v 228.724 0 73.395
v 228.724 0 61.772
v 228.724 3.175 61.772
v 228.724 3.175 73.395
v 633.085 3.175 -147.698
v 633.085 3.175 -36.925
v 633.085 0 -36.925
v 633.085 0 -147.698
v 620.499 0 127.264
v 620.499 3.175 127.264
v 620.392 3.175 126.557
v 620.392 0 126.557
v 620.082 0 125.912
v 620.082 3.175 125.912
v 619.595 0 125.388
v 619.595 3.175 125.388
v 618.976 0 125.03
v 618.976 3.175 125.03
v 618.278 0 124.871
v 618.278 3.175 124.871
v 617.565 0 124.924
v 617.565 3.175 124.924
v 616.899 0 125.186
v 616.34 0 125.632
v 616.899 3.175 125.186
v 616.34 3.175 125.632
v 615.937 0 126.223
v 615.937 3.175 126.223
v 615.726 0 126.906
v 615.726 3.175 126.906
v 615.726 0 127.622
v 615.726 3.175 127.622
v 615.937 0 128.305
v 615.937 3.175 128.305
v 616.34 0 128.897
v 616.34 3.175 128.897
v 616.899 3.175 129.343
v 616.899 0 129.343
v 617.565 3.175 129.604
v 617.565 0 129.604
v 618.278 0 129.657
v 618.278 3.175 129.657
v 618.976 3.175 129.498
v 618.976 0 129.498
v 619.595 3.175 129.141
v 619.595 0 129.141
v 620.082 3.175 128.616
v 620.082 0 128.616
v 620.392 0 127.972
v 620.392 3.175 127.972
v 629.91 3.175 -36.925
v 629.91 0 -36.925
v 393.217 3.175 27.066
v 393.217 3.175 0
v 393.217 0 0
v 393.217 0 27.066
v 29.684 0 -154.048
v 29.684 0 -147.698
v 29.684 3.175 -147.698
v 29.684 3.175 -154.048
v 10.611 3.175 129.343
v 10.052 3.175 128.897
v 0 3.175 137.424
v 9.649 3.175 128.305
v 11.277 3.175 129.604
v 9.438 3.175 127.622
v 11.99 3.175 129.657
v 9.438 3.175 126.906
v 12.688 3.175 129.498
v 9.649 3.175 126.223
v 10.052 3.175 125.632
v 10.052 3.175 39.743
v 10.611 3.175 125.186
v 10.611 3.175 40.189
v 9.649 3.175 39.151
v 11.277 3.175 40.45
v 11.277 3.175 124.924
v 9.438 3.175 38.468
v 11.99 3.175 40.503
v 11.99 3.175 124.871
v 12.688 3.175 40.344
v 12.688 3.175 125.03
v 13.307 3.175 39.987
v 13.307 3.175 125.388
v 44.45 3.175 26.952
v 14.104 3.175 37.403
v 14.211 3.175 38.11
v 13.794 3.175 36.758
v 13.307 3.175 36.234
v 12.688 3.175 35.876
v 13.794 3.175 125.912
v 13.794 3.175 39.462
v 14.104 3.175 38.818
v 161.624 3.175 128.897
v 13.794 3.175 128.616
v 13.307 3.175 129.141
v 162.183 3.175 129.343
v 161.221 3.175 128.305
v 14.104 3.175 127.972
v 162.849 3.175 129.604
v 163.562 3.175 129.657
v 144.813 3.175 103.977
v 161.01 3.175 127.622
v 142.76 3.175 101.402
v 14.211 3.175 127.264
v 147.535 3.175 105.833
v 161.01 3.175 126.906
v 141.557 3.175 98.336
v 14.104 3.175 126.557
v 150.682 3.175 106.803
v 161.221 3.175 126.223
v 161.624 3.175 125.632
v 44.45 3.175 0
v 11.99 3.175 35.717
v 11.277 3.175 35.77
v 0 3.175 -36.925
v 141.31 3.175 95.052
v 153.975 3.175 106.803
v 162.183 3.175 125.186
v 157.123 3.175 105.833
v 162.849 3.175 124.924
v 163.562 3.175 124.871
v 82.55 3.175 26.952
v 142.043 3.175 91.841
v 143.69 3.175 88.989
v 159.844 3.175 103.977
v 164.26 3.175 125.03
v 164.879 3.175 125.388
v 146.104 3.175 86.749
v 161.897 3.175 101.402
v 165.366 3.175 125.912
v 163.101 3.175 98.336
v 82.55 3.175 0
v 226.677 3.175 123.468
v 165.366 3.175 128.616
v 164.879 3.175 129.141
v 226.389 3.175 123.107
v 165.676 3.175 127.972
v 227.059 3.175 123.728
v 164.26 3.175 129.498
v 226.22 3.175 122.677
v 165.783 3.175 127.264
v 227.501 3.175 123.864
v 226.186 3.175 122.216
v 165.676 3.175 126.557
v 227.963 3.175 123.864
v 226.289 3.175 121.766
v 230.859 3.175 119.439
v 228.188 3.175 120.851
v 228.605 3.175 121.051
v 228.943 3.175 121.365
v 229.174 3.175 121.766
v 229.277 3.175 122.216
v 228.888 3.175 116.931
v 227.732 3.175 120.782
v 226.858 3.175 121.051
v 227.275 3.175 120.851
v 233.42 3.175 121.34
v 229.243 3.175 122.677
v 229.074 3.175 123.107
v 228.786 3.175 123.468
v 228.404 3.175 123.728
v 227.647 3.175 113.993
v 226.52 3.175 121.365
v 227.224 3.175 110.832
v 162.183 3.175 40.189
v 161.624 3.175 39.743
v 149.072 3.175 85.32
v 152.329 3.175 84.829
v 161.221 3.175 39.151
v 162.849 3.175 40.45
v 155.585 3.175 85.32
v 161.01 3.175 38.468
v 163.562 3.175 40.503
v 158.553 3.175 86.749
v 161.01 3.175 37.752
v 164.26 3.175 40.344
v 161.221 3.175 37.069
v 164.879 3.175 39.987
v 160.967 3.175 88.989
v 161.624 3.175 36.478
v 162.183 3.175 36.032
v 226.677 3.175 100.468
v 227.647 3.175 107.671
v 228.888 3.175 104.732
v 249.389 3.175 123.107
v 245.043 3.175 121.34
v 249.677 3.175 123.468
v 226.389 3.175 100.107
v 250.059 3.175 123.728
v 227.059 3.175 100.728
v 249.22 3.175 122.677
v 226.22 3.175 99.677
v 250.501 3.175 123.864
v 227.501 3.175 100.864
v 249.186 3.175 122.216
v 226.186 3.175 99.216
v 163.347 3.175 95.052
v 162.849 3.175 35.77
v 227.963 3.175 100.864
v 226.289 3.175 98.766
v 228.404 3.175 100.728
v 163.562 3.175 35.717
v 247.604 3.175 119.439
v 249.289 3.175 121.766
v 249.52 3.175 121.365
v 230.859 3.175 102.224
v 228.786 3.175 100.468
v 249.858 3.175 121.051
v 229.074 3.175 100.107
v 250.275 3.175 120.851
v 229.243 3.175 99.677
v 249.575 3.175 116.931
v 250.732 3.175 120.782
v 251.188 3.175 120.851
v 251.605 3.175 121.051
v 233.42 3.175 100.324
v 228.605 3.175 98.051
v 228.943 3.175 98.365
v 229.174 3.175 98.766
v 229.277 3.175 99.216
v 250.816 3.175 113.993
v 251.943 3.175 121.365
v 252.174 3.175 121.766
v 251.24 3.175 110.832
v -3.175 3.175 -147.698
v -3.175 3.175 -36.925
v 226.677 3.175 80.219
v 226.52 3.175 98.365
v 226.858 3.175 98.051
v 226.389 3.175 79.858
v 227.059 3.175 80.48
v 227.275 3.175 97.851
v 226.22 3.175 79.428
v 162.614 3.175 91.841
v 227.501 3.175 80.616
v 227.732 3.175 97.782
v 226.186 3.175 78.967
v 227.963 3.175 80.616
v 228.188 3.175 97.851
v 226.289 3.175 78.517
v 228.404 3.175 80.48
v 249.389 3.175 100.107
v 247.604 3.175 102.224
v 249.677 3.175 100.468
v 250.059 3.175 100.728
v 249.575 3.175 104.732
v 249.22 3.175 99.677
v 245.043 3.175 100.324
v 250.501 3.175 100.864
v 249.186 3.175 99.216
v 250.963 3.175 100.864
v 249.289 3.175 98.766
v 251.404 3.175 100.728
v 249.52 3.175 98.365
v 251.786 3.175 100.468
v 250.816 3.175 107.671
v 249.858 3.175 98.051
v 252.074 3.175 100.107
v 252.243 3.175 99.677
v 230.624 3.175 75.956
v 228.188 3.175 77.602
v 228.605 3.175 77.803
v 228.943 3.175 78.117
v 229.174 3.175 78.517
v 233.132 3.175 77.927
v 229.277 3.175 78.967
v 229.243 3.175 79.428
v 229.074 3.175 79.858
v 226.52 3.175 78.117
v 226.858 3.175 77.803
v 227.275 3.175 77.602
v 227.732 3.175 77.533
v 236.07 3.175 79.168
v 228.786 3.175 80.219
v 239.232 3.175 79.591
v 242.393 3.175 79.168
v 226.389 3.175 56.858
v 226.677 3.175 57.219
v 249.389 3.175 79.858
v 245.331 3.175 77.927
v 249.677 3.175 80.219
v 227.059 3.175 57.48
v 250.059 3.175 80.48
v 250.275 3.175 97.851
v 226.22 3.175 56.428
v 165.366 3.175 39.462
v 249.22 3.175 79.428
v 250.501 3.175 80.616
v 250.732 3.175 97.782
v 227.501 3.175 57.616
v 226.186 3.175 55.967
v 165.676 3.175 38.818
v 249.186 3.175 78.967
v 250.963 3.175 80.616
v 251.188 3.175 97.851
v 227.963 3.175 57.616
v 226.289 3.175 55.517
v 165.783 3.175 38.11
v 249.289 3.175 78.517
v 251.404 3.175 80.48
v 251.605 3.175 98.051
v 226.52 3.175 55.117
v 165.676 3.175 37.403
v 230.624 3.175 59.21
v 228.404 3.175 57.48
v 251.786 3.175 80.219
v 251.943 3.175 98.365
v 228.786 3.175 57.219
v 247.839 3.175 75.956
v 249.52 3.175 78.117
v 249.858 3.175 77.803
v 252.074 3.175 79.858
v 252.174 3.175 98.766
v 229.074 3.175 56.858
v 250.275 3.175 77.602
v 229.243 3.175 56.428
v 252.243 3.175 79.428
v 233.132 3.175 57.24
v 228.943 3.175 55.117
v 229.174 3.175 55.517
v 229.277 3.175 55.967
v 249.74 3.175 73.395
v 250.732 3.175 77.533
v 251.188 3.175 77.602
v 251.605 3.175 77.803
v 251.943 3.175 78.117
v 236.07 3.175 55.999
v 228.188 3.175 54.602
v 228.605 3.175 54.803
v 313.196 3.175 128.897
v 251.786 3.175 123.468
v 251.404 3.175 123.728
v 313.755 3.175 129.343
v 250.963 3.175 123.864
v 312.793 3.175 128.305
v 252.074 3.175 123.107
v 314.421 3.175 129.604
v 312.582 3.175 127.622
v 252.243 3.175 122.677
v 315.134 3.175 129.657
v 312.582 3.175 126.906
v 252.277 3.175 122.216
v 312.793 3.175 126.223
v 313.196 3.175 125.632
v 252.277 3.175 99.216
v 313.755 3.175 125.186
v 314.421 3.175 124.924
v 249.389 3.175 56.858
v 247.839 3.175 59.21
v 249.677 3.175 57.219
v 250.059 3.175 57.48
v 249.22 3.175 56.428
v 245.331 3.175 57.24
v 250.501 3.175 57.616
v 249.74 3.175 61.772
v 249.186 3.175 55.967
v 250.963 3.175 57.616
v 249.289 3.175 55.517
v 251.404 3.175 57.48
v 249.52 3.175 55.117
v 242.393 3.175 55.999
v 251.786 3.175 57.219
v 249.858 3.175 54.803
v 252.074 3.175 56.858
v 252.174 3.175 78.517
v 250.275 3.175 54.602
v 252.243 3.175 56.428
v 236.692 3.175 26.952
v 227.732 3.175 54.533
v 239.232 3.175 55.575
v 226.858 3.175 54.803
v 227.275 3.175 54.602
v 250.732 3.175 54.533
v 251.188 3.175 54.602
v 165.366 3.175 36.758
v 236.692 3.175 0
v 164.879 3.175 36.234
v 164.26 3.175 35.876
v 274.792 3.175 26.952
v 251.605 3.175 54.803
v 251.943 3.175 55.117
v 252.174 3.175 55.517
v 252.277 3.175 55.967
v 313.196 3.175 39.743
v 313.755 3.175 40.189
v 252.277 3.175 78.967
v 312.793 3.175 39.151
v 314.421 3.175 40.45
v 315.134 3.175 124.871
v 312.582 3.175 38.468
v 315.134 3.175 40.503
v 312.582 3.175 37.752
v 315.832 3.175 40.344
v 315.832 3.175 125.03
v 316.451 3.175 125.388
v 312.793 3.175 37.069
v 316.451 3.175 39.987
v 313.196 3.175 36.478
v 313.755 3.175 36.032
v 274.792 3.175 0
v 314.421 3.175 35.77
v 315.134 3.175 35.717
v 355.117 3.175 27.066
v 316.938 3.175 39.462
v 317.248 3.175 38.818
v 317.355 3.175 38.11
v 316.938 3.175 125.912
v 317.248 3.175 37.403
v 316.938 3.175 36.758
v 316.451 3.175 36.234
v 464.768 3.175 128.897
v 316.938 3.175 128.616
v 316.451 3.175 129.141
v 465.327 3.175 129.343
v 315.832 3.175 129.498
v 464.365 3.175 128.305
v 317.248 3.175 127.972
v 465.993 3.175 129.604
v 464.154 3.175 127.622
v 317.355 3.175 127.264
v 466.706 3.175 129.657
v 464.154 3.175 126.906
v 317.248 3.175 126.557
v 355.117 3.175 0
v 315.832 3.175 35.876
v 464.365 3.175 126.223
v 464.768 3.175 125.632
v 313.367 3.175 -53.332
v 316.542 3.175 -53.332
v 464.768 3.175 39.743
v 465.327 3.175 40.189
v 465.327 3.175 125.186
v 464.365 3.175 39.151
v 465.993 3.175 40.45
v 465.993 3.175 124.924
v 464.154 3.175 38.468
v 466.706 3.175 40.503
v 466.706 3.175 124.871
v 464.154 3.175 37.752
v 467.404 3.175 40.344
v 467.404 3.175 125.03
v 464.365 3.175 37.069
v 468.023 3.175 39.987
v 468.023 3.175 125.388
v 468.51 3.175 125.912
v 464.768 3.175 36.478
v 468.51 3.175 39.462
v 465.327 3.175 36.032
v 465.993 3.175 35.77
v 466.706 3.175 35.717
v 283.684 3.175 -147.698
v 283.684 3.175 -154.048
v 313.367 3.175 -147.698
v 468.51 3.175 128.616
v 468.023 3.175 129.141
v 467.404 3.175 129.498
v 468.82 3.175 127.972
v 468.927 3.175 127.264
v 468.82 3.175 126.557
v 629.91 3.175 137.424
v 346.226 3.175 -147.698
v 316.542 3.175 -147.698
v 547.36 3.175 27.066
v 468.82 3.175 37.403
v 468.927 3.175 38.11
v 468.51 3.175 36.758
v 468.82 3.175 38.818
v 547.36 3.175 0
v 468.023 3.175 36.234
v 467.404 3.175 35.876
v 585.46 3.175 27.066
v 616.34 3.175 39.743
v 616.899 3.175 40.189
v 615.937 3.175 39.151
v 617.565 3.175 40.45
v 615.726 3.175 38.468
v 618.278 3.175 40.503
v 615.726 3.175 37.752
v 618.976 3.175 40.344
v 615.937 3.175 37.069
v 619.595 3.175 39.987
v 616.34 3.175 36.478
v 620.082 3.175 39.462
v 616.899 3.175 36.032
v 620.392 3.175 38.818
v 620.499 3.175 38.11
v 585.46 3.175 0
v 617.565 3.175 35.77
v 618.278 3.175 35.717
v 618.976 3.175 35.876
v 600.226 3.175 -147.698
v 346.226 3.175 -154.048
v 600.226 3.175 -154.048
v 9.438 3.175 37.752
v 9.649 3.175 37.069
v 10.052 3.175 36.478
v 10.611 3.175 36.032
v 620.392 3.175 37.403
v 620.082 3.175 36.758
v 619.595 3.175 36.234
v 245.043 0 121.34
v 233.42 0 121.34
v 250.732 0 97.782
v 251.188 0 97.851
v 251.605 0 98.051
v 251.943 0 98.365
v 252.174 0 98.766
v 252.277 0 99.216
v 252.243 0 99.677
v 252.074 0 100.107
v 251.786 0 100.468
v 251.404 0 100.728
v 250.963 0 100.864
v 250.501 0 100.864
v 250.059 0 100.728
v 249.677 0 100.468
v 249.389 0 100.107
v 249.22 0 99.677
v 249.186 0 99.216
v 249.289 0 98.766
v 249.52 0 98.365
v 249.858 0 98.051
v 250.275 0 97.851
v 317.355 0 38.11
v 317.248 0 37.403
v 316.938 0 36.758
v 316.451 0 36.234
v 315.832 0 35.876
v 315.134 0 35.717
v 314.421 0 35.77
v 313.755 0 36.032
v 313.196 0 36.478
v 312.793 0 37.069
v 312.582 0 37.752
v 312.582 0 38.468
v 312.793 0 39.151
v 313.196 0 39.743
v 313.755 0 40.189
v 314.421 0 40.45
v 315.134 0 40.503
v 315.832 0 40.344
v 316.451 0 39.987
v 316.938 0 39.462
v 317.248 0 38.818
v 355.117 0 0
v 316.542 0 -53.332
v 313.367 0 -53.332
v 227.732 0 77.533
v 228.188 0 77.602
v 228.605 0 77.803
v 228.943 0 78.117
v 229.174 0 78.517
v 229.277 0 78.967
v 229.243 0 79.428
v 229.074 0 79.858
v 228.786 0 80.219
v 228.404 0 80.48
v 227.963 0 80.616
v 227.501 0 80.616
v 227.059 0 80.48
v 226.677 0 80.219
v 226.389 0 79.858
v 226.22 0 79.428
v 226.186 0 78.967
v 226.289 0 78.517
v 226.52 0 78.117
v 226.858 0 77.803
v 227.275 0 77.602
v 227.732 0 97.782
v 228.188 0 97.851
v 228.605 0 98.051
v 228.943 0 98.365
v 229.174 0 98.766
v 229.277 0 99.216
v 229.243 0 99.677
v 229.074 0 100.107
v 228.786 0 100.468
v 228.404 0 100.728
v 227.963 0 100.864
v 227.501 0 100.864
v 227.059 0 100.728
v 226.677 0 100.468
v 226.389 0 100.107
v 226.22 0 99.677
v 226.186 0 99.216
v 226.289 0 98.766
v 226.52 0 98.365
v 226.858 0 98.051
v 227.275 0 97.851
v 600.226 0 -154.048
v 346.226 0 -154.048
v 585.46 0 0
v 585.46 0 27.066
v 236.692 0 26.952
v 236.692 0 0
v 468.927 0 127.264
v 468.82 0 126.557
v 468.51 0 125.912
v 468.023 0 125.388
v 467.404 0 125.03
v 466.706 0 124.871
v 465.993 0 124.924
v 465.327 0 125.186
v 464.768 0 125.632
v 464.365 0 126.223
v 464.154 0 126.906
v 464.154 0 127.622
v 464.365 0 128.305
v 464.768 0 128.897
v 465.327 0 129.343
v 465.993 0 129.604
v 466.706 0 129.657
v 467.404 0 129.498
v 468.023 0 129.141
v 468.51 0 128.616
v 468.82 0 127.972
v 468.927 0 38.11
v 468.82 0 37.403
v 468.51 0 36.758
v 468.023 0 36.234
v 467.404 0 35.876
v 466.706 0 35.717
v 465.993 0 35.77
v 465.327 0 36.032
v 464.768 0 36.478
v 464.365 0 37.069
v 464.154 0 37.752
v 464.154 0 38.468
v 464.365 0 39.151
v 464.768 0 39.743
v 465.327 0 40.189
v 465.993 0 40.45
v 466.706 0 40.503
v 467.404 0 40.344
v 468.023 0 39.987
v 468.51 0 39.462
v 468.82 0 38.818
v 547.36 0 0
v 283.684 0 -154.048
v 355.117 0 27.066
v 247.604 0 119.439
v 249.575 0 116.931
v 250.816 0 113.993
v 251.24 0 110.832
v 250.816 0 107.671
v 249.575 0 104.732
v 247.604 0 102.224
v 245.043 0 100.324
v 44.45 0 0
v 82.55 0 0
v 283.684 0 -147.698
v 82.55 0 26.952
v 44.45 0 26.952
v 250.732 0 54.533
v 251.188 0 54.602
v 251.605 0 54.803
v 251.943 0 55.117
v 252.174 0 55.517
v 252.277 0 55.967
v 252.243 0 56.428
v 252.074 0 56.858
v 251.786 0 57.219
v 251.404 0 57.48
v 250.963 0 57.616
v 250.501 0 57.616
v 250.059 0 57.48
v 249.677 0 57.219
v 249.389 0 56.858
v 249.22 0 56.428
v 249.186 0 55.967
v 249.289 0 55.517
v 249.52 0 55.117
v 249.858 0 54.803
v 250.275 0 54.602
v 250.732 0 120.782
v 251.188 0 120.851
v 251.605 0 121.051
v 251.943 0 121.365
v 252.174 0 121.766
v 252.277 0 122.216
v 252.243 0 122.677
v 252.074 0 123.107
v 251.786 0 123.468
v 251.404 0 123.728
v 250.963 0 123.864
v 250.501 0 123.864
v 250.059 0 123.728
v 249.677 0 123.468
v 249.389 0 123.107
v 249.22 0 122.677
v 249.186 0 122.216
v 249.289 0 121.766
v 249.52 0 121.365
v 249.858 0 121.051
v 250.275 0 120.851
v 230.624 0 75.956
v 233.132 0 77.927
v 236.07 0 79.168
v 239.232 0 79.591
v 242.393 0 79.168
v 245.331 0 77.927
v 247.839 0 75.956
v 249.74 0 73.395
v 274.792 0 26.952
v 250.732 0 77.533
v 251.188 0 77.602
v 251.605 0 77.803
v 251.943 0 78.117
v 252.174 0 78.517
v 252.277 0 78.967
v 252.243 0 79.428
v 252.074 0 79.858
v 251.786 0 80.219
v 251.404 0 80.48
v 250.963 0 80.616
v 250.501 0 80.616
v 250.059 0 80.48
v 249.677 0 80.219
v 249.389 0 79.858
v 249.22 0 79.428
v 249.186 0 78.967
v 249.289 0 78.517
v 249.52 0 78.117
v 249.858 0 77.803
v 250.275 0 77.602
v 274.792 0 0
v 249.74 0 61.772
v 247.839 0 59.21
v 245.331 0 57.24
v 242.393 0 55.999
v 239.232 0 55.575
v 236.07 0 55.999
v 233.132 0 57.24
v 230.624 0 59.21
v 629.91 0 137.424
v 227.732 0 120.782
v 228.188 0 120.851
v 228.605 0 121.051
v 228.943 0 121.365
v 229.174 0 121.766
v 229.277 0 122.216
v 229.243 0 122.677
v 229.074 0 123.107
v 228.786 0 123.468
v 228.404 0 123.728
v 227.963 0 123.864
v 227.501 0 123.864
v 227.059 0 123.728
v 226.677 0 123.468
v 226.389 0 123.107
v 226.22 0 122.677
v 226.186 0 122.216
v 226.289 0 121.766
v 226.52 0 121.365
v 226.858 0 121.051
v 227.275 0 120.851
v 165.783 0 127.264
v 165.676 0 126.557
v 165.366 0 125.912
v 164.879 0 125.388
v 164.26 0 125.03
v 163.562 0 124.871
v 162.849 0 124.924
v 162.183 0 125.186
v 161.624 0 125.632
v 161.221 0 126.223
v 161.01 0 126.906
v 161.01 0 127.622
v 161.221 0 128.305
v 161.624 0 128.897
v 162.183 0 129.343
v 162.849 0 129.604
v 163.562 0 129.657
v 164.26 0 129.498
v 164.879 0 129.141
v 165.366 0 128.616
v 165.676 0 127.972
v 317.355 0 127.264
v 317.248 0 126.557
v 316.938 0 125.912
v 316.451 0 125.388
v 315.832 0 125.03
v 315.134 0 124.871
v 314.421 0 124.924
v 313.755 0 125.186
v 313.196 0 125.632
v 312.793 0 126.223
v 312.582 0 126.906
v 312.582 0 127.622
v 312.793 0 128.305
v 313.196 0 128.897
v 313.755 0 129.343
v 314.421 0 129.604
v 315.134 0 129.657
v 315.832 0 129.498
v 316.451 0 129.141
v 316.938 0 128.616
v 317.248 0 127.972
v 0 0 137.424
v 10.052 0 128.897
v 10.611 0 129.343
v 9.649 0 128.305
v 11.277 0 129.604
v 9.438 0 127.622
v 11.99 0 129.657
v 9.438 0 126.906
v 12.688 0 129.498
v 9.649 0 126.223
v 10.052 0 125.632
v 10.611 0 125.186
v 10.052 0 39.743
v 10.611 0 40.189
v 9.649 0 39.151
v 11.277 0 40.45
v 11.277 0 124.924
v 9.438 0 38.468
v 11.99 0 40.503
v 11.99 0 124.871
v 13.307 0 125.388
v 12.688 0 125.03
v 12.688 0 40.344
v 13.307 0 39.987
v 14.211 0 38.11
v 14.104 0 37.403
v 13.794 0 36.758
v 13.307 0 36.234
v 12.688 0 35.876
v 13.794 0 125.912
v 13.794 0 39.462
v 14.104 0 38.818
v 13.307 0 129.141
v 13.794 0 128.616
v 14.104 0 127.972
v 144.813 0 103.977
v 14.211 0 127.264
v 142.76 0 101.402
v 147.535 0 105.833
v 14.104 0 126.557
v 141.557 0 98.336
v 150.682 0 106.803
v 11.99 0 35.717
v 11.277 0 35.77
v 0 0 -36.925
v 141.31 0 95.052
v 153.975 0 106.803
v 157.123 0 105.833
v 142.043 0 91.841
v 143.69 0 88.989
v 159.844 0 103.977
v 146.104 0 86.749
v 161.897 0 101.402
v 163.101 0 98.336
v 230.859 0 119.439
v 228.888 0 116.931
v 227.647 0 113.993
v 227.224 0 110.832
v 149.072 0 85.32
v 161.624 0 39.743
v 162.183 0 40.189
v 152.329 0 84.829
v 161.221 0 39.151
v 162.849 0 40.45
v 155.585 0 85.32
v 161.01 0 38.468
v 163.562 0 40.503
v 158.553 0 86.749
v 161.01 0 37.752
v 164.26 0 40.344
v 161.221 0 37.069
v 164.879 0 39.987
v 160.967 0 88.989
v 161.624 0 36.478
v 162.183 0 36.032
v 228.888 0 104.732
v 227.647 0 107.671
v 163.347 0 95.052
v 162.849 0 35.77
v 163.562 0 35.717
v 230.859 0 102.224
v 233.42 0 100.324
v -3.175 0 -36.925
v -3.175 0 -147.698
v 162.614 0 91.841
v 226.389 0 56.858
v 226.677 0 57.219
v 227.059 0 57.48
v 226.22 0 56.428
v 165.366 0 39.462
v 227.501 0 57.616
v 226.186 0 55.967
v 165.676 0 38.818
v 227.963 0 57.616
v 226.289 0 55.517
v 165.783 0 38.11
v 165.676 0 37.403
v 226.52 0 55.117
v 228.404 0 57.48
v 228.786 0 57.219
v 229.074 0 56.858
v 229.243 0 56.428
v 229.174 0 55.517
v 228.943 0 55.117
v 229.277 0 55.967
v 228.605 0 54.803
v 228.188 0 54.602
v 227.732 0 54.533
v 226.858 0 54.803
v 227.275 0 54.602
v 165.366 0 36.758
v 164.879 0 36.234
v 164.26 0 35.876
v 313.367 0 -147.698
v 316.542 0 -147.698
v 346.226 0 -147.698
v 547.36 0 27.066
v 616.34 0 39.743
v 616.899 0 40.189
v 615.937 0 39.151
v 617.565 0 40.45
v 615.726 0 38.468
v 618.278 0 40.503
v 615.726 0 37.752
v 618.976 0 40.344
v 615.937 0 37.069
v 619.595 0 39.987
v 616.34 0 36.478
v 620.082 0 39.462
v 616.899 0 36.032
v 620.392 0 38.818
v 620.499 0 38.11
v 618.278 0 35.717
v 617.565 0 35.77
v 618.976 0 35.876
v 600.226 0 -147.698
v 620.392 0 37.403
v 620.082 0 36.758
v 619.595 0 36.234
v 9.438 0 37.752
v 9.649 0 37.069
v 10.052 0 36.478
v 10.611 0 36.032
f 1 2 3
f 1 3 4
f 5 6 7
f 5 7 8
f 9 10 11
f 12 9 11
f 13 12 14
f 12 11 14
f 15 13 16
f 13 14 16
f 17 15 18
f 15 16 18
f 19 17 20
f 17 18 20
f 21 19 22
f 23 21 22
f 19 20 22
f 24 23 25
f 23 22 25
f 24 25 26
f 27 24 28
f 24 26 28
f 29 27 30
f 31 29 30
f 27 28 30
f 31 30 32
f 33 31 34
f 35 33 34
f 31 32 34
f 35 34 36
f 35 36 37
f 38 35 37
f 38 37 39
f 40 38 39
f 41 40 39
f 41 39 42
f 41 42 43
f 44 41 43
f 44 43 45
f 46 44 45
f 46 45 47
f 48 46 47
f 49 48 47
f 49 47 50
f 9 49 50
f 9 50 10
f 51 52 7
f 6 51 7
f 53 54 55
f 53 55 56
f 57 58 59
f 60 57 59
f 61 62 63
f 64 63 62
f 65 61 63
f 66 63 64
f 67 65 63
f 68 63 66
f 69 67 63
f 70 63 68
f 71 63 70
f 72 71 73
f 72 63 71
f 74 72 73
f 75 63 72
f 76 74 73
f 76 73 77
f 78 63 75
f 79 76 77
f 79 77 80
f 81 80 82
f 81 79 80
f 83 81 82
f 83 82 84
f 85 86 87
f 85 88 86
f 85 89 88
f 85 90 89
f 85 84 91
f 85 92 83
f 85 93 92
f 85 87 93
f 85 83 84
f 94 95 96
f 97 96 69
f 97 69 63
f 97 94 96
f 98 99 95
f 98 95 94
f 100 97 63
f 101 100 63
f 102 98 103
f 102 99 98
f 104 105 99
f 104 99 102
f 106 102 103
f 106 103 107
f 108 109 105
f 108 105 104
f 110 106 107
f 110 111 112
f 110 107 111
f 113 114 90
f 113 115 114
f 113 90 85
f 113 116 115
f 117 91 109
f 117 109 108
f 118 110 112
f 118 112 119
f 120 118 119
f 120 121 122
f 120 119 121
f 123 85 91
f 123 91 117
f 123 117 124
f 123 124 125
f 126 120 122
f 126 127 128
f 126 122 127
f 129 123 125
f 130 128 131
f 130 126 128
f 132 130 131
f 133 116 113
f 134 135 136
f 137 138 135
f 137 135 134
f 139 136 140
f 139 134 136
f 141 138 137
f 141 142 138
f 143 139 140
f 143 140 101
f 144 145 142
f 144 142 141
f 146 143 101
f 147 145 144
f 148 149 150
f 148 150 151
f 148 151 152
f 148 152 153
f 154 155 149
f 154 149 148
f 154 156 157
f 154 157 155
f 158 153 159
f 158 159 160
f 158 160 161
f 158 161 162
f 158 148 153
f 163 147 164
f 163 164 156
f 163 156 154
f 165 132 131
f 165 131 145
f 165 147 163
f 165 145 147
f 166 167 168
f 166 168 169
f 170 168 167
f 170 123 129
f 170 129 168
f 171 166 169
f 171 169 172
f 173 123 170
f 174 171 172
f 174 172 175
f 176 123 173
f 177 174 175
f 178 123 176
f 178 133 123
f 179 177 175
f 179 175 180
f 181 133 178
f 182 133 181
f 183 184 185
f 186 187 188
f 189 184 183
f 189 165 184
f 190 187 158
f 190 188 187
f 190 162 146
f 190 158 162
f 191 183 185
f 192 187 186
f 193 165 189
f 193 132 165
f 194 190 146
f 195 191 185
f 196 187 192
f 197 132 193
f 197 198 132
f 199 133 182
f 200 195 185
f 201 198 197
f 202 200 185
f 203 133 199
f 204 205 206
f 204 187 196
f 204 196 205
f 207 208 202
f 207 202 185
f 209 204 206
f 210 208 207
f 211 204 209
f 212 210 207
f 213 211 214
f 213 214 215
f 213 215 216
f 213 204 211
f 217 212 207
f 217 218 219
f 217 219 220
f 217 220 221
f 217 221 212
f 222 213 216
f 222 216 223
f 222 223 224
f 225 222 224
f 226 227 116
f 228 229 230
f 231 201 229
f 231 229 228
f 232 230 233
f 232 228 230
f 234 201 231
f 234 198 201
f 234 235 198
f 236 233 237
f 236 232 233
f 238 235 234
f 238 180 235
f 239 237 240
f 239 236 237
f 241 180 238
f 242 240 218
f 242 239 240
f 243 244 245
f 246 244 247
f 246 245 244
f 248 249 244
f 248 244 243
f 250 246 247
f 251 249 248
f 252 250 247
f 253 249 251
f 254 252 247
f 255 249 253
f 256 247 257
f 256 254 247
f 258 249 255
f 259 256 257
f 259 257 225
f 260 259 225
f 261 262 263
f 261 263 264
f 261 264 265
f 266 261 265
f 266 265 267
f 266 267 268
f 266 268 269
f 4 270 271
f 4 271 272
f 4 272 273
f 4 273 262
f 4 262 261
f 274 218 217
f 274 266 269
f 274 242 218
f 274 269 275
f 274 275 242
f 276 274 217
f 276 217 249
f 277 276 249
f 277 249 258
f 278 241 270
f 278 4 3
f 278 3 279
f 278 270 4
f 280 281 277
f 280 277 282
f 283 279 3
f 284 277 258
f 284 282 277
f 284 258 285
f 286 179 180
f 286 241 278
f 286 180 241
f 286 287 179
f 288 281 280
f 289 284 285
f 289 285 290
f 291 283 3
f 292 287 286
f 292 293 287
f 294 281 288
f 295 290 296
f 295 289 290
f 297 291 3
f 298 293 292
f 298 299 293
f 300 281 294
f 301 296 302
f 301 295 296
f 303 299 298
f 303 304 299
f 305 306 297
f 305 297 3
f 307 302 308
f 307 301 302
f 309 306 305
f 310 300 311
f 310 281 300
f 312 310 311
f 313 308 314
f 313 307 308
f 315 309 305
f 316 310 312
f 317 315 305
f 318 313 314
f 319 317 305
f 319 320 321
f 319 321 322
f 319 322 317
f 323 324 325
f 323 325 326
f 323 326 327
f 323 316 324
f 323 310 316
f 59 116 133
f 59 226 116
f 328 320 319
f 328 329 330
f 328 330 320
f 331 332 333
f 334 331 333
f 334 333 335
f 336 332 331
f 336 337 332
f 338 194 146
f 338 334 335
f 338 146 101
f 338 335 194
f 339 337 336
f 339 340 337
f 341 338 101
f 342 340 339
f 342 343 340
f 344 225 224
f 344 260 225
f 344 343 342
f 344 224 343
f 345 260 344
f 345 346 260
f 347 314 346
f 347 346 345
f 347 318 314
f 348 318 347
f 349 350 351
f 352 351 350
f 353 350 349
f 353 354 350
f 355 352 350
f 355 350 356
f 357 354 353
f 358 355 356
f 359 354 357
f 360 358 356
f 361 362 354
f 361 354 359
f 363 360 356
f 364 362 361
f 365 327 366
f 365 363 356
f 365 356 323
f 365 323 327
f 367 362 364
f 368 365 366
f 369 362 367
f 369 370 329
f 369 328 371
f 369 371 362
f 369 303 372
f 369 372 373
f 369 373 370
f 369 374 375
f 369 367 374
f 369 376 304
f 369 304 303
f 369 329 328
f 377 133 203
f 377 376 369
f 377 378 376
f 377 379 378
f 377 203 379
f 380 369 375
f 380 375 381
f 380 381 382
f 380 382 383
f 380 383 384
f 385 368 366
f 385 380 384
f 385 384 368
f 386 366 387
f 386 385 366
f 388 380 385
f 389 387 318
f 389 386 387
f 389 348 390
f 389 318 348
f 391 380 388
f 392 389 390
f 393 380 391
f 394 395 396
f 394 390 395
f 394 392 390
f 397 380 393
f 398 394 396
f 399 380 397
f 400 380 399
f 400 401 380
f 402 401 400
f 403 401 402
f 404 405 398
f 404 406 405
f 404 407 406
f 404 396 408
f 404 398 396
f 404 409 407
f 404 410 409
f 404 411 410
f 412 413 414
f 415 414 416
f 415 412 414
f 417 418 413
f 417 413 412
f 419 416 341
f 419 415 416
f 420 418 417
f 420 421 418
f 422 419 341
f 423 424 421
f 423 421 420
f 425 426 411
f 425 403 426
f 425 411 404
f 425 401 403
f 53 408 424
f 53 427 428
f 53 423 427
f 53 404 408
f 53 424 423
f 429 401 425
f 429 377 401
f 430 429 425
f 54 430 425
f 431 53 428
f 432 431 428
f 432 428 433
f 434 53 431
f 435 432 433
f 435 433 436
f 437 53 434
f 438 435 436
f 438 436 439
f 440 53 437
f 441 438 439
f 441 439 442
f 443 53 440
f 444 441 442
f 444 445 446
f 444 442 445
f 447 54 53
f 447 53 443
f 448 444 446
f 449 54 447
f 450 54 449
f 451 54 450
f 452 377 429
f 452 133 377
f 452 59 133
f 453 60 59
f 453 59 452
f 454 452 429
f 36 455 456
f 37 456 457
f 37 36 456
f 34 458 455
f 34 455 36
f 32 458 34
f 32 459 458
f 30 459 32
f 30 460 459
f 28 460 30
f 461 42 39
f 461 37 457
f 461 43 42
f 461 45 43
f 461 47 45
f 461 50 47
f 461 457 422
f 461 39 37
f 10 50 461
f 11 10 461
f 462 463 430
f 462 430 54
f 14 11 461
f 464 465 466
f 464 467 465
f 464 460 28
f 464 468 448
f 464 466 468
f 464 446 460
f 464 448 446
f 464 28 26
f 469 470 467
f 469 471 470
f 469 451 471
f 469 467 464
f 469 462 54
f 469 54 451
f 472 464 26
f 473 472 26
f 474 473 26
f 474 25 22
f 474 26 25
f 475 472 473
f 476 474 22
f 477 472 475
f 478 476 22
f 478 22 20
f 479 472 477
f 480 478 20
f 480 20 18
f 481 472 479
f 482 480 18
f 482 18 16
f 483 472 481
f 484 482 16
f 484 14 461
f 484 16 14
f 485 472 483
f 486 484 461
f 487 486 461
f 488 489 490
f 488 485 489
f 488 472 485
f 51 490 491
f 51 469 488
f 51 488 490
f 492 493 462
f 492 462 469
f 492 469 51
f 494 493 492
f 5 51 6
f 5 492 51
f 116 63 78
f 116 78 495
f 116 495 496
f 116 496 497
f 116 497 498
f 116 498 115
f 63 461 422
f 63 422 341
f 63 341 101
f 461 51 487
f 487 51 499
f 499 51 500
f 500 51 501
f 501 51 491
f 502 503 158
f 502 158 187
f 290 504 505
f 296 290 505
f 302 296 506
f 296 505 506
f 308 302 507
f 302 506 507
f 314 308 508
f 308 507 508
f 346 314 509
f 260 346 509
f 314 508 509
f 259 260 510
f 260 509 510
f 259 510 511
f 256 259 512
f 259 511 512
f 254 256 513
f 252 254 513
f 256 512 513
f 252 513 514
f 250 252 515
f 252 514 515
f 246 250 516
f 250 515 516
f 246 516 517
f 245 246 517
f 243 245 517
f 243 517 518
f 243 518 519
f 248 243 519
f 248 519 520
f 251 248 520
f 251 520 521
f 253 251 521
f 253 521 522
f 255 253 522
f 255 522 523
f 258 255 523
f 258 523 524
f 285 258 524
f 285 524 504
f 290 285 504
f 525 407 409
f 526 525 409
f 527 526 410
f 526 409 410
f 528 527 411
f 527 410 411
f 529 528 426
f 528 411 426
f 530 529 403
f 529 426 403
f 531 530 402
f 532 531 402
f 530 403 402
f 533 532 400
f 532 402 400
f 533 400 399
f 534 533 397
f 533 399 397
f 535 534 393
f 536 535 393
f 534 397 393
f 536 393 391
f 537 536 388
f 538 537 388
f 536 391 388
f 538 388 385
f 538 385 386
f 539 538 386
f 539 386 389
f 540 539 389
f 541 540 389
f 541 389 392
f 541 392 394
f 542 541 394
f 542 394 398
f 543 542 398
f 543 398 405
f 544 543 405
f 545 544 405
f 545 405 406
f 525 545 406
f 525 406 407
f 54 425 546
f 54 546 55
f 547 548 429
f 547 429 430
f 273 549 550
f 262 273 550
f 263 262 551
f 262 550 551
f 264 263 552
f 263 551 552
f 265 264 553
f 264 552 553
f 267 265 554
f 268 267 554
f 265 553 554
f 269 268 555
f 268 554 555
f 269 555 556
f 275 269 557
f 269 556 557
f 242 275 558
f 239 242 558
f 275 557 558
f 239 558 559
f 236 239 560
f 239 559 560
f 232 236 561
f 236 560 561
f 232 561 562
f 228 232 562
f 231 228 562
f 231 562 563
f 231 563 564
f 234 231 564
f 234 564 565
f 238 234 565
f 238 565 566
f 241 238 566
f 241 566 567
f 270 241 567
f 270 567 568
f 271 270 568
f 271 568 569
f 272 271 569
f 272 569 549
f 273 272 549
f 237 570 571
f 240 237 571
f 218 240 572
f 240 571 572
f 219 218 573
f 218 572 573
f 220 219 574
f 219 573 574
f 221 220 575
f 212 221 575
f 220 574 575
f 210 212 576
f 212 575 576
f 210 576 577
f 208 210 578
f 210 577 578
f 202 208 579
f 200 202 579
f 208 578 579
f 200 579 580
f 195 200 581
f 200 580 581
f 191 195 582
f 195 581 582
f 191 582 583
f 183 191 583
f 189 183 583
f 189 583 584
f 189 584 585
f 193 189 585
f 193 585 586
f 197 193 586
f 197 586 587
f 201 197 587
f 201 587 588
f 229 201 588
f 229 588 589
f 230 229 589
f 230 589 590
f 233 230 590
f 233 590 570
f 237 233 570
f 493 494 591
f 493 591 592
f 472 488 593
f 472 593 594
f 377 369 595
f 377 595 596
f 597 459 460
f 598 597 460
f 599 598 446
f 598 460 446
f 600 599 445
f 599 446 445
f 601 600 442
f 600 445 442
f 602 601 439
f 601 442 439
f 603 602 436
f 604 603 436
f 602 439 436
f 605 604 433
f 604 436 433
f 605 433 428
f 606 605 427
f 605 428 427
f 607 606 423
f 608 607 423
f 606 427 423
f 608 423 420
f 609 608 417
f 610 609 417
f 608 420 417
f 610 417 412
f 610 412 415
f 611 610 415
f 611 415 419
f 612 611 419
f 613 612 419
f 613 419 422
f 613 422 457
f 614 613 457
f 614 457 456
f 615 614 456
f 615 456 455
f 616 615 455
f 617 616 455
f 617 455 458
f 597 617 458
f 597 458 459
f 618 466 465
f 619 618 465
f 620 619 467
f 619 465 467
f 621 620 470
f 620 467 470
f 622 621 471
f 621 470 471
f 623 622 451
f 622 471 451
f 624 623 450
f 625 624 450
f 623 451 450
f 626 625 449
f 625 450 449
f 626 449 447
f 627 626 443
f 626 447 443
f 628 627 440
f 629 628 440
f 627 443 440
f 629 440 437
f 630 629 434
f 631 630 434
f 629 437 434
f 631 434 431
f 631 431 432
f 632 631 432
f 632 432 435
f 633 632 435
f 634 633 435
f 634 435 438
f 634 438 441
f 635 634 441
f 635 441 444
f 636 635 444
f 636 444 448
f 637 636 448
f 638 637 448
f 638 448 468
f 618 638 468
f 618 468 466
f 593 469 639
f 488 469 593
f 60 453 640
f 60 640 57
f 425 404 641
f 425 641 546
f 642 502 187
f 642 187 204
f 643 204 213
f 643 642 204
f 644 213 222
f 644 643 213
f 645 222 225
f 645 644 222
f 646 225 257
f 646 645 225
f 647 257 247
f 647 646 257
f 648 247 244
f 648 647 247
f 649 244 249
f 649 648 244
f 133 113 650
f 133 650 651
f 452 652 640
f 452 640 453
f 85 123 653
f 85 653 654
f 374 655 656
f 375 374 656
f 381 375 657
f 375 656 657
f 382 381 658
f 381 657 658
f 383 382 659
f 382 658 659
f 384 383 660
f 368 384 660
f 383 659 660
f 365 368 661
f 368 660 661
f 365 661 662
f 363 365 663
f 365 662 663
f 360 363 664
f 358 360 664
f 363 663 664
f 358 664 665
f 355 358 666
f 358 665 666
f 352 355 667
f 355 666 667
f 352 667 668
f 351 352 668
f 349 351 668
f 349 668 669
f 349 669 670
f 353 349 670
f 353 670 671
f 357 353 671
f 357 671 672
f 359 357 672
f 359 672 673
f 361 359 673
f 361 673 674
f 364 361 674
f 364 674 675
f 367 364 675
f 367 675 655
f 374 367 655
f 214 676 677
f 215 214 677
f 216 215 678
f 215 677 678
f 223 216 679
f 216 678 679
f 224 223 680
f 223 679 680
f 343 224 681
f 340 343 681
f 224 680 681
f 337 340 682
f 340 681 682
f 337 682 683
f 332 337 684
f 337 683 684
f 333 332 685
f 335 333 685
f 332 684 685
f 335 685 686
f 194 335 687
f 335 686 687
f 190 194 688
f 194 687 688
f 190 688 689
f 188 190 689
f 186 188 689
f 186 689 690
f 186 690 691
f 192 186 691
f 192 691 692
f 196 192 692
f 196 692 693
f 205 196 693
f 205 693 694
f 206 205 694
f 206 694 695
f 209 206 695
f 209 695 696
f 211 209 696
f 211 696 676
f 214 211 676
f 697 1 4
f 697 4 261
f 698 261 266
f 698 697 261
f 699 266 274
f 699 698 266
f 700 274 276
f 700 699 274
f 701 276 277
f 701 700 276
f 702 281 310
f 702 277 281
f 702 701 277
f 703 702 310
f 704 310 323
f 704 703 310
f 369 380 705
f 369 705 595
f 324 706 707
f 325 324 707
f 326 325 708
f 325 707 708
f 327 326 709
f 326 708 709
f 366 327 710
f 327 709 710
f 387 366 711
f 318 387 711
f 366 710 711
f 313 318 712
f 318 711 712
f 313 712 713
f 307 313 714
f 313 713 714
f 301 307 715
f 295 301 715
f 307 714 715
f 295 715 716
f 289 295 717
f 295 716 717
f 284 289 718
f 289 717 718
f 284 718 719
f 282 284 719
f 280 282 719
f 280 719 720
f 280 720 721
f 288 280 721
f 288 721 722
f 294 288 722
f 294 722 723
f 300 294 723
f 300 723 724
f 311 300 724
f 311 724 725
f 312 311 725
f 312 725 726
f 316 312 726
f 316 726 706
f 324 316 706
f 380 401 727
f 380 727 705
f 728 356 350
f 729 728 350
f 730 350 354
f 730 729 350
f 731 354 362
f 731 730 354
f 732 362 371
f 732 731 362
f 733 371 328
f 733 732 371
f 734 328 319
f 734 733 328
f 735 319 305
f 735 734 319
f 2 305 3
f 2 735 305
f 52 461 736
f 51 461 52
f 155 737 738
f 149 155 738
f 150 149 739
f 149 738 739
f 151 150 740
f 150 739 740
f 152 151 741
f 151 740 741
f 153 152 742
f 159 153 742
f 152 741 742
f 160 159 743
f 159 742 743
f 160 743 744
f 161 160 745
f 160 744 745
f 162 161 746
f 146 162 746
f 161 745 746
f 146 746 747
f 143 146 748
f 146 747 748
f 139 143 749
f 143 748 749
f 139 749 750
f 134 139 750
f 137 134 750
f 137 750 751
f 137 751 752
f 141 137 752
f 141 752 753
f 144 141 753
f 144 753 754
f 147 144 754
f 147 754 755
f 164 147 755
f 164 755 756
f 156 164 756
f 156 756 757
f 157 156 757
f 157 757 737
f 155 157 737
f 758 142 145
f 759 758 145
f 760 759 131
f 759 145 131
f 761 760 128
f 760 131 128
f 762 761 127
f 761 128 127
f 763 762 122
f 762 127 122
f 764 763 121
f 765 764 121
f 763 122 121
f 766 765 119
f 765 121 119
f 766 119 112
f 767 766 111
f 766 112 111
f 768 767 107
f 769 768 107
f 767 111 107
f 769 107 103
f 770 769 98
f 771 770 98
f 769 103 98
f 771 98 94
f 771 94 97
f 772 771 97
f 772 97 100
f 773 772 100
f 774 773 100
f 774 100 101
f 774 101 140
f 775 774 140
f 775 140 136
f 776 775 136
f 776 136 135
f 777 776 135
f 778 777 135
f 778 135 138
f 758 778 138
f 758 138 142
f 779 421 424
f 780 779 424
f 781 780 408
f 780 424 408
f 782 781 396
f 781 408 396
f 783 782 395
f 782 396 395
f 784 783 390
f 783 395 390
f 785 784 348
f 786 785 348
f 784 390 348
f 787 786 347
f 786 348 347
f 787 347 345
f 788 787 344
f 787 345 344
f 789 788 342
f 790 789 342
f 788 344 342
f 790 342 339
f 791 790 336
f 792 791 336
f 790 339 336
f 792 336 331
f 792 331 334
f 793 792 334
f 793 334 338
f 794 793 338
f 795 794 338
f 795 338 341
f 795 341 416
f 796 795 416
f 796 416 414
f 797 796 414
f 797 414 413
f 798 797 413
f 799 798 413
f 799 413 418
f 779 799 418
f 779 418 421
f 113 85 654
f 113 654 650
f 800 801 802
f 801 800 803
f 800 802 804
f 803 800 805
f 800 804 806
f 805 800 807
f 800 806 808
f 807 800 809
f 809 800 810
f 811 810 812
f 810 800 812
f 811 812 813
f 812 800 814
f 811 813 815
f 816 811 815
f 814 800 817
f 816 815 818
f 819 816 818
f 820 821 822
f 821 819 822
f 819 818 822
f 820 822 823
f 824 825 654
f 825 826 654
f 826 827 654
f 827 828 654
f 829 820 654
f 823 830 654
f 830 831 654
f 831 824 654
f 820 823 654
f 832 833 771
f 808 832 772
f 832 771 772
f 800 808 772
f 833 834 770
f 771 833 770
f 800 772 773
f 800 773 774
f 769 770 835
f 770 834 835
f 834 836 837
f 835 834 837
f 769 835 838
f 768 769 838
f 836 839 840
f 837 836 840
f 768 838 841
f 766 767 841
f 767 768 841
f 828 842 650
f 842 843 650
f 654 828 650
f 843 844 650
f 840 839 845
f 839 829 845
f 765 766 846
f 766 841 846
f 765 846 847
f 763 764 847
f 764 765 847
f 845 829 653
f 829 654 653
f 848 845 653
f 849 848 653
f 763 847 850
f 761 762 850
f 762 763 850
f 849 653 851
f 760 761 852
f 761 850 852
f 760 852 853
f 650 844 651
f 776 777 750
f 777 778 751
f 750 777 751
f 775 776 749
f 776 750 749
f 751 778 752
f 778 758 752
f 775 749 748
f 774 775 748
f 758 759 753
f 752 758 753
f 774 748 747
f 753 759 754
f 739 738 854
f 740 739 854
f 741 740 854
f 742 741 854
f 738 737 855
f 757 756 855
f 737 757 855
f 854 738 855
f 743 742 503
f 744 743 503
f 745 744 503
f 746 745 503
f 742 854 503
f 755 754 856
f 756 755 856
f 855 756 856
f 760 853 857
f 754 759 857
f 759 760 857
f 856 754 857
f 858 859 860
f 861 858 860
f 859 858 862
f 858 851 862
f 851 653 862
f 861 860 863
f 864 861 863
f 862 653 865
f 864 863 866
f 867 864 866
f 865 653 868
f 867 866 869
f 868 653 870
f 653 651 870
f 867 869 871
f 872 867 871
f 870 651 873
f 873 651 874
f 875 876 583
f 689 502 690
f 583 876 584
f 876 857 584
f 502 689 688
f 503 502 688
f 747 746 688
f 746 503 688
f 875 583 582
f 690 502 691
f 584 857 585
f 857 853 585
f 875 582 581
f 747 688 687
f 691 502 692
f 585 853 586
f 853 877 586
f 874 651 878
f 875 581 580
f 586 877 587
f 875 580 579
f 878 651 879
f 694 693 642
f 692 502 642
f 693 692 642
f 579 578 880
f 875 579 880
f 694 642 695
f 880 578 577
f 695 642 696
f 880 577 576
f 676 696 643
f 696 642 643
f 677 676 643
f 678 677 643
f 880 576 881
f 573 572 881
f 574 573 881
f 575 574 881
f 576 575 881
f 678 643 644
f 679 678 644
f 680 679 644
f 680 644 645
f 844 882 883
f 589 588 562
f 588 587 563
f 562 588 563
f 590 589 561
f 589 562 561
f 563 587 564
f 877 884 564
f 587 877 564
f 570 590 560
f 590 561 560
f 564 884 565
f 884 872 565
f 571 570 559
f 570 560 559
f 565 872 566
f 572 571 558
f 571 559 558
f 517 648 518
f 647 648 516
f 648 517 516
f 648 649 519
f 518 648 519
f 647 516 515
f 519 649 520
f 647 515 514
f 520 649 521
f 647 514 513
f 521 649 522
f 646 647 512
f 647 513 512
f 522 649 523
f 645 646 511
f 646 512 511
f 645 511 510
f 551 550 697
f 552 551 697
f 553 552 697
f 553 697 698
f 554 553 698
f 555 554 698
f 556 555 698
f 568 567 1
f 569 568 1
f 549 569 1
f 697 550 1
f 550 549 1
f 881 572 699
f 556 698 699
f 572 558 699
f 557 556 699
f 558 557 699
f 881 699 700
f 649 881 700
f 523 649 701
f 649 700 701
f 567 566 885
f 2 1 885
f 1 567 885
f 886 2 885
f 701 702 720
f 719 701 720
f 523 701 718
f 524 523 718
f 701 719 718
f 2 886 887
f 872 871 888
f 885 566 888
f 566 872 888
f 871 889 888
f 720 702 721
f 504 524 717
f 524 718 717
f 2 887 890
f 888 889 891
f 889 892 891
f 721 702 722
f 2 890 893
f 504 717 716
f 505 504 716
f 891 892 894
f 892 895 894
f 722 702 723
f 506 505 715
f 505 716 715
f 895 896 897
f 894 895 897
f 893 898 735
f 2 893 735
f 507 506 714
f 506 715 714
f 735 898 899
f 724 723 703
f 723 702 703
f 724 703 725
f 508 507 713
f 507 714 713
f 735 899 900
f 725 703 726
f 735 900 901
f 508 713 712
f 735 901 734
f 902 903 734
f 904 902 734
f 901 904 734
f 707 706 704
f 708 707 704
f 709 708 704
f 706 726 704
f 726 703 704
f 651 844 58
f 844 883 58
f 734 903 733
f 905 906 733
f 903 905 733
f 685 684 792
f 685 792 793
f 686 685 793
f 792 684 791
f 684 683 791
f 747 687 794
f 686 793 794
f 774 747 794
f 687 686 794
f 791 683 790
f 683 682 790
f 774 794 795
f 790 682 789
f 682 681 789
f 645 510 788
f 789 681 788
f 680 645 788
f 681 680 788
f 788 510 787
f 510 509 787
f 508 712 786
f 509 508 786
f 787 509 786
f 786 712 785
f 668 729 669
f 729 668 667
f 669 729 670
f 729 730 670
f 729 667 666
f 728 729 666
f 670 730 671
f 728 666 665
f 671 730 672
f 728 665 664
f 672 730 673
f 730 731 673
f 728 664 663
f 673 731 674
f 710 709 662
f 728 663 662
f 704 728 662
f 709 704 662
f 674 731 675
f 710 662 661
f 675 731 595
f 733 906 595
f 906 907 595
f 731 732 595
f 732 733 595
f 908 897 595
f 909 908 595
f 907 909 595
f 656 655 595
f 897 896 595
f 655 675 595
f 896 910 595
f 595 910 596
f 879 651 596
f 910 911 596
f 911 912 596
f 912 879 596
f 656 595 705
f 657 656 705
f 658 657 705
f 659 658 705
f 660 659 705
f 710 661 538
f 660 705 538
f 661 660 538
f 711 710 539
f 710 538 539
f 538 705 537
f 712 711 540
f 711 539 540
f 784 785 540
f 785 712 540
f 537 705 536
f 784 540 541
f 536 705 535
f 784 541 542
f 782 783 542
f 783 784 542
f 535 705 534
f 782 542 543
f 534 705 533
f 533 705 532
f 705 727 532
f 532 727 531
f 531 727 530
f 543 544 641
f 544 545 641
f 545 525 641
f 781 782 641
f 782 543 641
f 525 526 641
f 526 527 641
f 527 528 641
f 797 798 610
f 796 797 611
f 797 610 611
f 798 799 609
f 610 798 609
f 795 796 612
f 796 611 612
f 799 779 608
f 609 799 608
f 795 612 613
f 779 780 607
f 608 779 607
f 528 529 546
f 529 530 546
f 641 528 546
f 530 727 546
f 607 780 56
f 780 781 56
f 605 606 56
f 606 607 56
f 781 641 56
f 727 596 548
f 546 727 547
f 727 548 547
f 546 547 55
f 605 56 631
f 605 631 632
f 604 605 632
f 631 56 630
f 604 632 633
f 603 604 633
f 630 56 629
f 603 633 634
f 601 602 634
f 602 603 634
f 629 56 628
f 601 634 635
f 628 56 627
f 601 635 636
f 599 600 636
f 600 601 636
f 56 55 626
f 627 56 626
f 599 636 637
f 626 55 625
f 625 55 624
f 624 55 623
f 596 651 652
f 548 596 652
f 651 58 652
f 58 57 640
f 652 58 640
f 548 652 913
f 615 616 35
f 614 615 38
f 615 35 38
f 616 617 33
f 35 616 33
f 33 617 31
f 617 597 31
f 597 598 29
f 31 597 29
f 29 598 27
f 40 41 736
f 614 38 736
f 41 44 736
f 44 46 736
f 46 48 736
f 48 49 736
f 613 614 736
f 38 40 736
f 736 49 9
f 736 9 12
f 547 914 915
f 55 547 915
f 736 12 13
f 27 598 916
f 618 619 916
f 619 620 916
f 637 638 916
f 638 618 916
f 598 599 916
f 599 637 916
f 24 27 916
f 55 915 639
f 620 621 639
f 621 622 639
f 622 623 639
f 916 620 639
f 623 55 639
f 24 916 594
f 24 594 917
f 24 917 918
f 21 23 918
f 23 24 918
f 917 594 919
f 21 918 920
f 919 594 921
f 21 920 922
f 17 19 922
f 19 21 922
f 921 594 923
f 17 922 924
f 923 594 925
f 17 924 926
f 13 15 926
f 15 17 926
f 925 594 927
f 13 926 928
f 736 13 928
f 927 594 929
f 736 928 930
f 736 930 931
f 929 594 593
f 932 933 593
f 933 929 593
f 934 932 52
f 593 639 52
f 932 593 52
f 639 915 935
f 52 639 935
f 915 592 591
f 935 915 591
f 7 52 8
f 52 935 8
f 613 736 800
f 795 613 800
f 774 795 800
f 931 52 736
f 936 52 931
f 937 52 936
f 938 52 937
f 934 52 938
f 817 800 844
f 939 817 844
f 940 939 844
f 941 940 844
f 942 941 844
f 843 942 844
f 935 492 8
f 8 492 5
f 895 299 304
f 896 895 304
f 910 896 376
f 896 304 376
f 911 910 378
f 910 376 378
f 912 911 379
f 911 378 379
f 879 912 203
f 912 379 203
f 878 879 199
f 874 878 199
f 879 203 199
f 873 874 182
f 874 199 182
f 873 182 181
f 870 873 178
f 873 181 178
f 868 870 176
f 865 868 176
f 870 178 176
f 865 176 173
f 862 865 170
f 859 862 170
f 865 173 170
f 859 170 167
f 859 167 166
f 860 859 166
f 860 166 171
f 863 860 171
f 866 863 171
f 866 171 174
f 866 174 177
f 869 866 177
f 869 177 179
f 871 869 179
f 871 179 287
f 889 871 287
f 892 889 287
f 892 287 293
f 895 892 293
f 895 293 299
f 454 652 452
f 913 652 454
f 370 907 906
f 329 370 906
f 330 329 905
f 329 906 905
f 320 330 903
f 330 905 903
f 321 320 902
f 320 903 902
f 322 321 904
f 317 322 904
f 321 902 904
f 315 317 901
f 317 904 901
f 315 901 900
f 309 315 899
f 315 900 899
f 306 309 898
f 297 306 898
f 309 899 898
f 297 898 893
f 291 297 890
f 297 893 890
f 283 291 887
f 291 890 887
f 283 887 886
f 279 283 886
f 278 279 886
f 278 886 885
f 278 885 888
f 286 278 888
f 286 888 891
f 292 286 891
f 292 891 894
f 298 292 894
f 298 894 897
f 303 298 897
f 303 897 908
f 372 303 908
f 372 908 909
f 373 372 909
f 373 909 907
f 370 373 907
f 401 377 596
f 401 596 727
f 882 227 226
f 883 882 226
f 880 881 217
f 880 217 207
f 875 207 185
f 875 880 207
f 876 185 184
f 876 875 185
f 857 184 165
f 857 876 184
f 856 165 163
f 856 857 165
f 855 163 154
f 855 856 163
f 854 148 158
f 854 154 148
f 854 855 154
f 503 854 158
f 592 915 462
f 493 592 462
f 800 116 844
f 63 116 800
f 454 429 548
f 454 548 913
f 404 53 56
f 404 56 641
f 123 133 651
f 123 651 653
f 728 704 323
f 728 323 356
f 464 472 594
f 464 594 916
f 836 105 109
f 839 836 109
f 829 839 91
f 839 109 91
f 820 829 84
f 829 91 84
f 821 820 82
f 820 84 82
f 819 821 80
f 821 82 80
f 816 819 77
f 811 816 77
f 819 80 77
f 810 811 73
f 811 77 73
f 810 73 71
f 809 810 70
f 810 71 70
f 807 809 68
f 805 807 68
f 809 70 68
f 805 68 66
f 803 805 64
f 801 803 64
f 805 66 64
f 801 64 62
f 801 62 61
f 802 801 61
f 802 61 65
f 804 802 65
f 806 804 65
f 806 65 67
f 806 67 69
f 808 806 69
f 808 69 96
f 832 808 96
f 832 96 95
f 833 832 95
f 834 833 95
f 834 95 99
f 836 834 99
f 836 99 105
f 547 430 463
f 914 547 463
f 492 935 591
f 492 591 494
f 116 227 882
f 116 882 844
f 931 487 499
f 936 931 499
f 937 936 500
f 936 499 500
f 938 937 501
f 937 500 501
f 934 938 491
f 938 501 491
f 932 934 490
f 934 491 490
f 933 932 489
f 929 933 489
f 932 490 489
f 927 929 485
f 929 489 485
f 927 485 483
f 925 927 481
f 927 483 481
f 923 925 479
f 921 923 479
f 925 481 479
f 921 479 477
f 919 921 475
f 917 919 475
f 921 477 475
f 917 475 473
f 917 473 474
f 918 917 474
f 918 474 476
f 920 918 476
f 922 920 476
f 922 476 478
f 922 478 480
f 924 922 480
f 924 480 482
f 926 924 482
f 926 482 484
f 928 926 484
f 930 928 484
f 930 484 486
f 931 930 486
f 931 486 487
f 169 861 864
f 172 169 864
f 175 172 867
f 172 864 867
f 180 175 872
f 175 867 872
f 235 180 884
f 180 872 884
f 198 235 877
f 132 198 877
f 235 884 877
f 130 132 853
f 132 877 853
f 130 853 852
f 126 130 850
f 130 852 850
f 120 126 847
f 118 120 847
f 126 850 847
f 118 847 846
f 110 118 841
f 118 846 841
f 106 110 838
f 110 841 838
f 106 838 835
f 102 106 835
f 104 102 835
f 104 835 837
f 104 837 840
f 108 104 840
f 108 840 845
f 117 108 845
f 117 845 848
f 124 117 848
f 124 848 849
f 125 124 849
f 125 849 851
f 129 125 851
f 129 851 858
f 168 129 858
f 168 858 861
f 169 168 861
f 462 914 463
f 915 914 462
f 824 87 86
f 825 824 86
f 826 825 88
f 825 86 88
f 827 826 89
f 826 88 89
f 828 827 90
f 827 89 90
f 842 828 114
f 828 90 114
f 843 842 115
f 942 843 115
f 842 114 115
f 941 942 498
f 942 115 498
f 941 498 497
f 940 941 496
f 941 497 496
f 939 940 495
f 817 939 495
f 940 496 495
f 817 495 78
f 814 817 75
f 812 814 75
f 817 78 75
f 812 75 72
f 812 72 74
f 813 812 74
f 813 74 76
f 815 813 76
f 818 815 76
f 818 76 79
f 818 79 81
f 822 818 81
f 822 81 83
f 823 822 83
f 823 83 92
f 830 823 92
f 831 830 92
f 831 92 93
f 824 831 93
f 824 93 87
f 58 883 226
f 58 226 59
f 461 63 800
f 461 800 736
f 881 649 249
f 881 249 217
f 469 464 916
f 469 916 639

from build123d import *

# Parameters (mm, degrees)
SKETCH1_W            = 629.90984
SKETCH1_H            = 147.69846
BOSS_EXTRUDE1_DEPTH  = 3.175
SKETCH3_W            = 254
SKETCH3_H            = 3.175
BOSS_EXTRUDE2_DEPTH  = 6.35
SKETCH4_W            = 3.175
SKETCH4_H            = 188.732840052
CUT_EXTRUDE1_DEPTH   = 3.175
SKETCH6_W            = 3.175
SKETCH6_H            = 110.773845
BOSS_EXTRUDE4_DEPTH  = 3.175
SKETCH8_W            = 629.90984
SKETCH8_H            = 18.04416
BOSS_EXTRUDE5_DEPTH  = 3.175
SKETCH10_W           = 38.1
SKETCH10_H           = 18.04416
SKETCH10_H_2         = 36.08832
CUT_EXTRUDE3_DEPTH   = 652.56536379
BOSS_EXTRUDE6_DEPTH  = 3.175
SKETCH13_R           = 1.55
SKETCH13_R_2         = 11.049
CUT_EXTRUDE4_DEPTH   = 652.56536379
M4_CLEARANCE_HOLE1_D = 4.8


with BuildPart() as part:
    # Sketch1 → Boss-Extrude1 (new body)
    with BuildSketch(Plane(origin=(0, 0, 0), x_dir=(1, 0, 0), z_dir=(0, 1, 0))):
        with Locations((314.95492, 73.84923)):
            Rectangle(SKETCH1_W, SKETCH1_H)
    extrude(amount=BOSS_EXTRUDE1_DEPTH)

    # Sketch3 → Boss-Extrude2 (add)
    with BuildSketch(Plane(origin=(0, 0, -147.69846), x_dir=(-1, 0, 0), z_dir=(0, 0, -1))):
        with Locations((-473.22613, 1.5875)):
            Rectangle(SKETCH3_W, SKETCH3_H)
        with Locations((-156.68371, 1.5875)):
            Rectangle(SKETCH3_W, SKETCH3_H)
    extrude(amount=BOSS_EXTRUDE2_DEPTH)

    # Sketch4 → Cut-Extrude1 (cut)
    with BuildSketch(Plane(origin=(0, 3.175, 0), x_dir=(1, 0, 0), z_dir=(0, 1, 0))):
        with Locations((314.95492, 147.69846)):
            Rectangle(SKETCH4_W, SKETCH4_H)
    extrude(amount=-CUT_EXTRUDE1_DEPTH, mode=Mode.SUBTRACT)

    # Sketch6 → Boss-Extrude4 (add)
    with BuildSketch(Plane(origin=(0, 3.175, 0), x_dir=(1, 0, 0), z_dir=(0, 1, 0))):
        with Locations((631.49734, 92.3115375)):
            Rectangle(SKETCH6_W, SKETCH6_H)
        with Locations((-1.5875, 92.3115375)):
            Rectangle(SKETCH6_W, SKETCH6_H)
    extrude(amount=-BOSS_EXTRUDE4_DEPTH)

    # Sketch8 → Boss-Extrude5 (add, through all)
    with BuildSketch(Plane(origin=(0, 3.175, 0), x_dir=(1, 0, 0), z_dir=(0, 1, 0))):
        with Locations((314.95492, -9.02208)):
            Rectangle(SKETCH8_W, SKETCH8_H)
    extrude(amount=-BOSS_EXTRUDE5_DEPTH)

    # Sketch10 → Cut-Extrude3 (cut, through all)
    with BuildSketch(Plane(origin=(0, 3.175, 0), x_dir=(1, 0, 0), z_dir=(0, 1, 0))):
        with Locations((374.1674, -9.02208)):
            Rectangle(SKETCH10_W, SKETCH10_H)
        with Locations((255.74244, -9.02208)):
            Rectangle(SKETCH10_W, SKETCH10_H)
        with Locations((566.40984, -18.04416)):
            Rectangle(SKETCH10_W, SKETCH10_H_2)
        with Locations((63.5, -18.04416)):
            Rectangle(SKETCH10_W, SKETCH10_H_2)
    extrude(amount=-CUT_EXTRUDE3_DEPTH, mode=Mode.SUBTRACT)

    # Sketch11 → Boss-Extrude6 (add, through all)
    with BuildSketch(Plane(origin=(0, 3.175, 0), x_dir=(1, 0, 0), z_dir=(0, 1, 0))):
        Polygon((0, -18.04416), (0, -137.42416), (629.90984, -137.42416), (629.90984, -18.04416), (585.45984, -18.04416), (585.45984, -27.06624), (547.35984, -27.06624), (547.35984, -18.04416), (393.2174, -18.04416), (393.2174, -27.06624), (355.1174, -27.06624), (355.1174, -18.04416), (274.79244, -18.04416), (274.79244, -26.95194), (236.69244, -26.95194), (236.69244, -18.04416), (82.55, -18.04416), (82.55, -26.95194), (44.45, -26.95194), (44.45, -18.04416), align=None)
    extrude(amount=-BOSS_EXTRUDE6_DEPTH)

    # Sketch13 → Cut-Extrude4 (cut, through all)
    with BuildSketch(Plane.XZ):
        with Locations(Location((227.731580951, 122.331796051, 0), (0, 0, 270))):
            Circle(SKETCH13_R)
        with Locations(Location((250.731580951, 122.331796051, 0), (0, 0, 270))):
            Circle(SKETCH13_R)
        with Locations(Location((227.731580951, 99.331796051, 0), (0, 0, 270))):
            Circle(SKETCH13_R)
        with Locations(Location((250.731580951, 99.331796051, 0), (0, 0, 270))):
            Circle(SKETCH13_R)
        with Locations(Location((152.328523542, 95.877856055, 0), (0, 0, 270))):
            Circle(SKETCH13_R_2)
        with Locations(Location((227.731580951, 79.083184621, 0), (0, 0, 270))):
            Circle(SKETCH13_R)
        with Locations(Location((227.731580951, 56.083184621, 0), (0, 0, 270))):
            Circle(SKETCH13_R)
        with Locations(Location((250.731580951, 56.083184621, 0), (0, 0, 270))):
            Circle(SKETCH13_R)
        with Locations(Location((250.731580951, 79.083184621, 0), (0, 0, 270))):
            Circle(SKETCH13_R)
        with BuildLine():
            Line((245.043121195, 100.323796051), (233.420040708, 100.323796051))
            ThreePointArc((233.420040708, 100.323796051), (227.223580951, 110.831796051), (233.420040708, 121.339796051))
            Line((233.420040708, 121.339796051), (245.043121195, 121.339796051))
            ThreePointArc((245.043121195, 121.339796051), (251.239580951, 110.831796051), (245.043121195, 100.323796051))
        make_face()
        with BuildLine():
            Line((249.739580951, 73.394724865), (249.739580951, 61.771644378))
            ThreePointArc((249.739580951, 61.771644378), (239.231580951, 55.575184621), (228.723580951, 61.771644378))
            Line((228.723580951, 61.771644378), (228.723580951, 73.394724865))
            ThreePointArc((228.723580951, 73.394724865), (239.231580951, 79.591184621), (249.739580951, 73.394724865))
        make_face()
    extrude(amount=-CUT_EXTRUDE4_DEPTH, mode=Mode.SUBTRACT)

    # M4 Clearance Hole1 (through all)
    with Locations(Plane(origin=(0, 0, 0), x_dir=(-1, 0, 0), z_dir=(0, -1, 0))):
        with Locations((-618.09884, -38.11016), (-466.52688, -38.11016), (-618.09884, -127.26416), (-466.52688, -127.26416), (-314.95492, -127.26416), (-314.95492, -38.11016), (-163.38296, -38.11016), (-11.811, -38.11016), (-11.811, -127.26416), (-163.38296, -127.26416)):
            Hole(M4_CLEARANCE_HOLE1_D / 2)


solid = part.part
